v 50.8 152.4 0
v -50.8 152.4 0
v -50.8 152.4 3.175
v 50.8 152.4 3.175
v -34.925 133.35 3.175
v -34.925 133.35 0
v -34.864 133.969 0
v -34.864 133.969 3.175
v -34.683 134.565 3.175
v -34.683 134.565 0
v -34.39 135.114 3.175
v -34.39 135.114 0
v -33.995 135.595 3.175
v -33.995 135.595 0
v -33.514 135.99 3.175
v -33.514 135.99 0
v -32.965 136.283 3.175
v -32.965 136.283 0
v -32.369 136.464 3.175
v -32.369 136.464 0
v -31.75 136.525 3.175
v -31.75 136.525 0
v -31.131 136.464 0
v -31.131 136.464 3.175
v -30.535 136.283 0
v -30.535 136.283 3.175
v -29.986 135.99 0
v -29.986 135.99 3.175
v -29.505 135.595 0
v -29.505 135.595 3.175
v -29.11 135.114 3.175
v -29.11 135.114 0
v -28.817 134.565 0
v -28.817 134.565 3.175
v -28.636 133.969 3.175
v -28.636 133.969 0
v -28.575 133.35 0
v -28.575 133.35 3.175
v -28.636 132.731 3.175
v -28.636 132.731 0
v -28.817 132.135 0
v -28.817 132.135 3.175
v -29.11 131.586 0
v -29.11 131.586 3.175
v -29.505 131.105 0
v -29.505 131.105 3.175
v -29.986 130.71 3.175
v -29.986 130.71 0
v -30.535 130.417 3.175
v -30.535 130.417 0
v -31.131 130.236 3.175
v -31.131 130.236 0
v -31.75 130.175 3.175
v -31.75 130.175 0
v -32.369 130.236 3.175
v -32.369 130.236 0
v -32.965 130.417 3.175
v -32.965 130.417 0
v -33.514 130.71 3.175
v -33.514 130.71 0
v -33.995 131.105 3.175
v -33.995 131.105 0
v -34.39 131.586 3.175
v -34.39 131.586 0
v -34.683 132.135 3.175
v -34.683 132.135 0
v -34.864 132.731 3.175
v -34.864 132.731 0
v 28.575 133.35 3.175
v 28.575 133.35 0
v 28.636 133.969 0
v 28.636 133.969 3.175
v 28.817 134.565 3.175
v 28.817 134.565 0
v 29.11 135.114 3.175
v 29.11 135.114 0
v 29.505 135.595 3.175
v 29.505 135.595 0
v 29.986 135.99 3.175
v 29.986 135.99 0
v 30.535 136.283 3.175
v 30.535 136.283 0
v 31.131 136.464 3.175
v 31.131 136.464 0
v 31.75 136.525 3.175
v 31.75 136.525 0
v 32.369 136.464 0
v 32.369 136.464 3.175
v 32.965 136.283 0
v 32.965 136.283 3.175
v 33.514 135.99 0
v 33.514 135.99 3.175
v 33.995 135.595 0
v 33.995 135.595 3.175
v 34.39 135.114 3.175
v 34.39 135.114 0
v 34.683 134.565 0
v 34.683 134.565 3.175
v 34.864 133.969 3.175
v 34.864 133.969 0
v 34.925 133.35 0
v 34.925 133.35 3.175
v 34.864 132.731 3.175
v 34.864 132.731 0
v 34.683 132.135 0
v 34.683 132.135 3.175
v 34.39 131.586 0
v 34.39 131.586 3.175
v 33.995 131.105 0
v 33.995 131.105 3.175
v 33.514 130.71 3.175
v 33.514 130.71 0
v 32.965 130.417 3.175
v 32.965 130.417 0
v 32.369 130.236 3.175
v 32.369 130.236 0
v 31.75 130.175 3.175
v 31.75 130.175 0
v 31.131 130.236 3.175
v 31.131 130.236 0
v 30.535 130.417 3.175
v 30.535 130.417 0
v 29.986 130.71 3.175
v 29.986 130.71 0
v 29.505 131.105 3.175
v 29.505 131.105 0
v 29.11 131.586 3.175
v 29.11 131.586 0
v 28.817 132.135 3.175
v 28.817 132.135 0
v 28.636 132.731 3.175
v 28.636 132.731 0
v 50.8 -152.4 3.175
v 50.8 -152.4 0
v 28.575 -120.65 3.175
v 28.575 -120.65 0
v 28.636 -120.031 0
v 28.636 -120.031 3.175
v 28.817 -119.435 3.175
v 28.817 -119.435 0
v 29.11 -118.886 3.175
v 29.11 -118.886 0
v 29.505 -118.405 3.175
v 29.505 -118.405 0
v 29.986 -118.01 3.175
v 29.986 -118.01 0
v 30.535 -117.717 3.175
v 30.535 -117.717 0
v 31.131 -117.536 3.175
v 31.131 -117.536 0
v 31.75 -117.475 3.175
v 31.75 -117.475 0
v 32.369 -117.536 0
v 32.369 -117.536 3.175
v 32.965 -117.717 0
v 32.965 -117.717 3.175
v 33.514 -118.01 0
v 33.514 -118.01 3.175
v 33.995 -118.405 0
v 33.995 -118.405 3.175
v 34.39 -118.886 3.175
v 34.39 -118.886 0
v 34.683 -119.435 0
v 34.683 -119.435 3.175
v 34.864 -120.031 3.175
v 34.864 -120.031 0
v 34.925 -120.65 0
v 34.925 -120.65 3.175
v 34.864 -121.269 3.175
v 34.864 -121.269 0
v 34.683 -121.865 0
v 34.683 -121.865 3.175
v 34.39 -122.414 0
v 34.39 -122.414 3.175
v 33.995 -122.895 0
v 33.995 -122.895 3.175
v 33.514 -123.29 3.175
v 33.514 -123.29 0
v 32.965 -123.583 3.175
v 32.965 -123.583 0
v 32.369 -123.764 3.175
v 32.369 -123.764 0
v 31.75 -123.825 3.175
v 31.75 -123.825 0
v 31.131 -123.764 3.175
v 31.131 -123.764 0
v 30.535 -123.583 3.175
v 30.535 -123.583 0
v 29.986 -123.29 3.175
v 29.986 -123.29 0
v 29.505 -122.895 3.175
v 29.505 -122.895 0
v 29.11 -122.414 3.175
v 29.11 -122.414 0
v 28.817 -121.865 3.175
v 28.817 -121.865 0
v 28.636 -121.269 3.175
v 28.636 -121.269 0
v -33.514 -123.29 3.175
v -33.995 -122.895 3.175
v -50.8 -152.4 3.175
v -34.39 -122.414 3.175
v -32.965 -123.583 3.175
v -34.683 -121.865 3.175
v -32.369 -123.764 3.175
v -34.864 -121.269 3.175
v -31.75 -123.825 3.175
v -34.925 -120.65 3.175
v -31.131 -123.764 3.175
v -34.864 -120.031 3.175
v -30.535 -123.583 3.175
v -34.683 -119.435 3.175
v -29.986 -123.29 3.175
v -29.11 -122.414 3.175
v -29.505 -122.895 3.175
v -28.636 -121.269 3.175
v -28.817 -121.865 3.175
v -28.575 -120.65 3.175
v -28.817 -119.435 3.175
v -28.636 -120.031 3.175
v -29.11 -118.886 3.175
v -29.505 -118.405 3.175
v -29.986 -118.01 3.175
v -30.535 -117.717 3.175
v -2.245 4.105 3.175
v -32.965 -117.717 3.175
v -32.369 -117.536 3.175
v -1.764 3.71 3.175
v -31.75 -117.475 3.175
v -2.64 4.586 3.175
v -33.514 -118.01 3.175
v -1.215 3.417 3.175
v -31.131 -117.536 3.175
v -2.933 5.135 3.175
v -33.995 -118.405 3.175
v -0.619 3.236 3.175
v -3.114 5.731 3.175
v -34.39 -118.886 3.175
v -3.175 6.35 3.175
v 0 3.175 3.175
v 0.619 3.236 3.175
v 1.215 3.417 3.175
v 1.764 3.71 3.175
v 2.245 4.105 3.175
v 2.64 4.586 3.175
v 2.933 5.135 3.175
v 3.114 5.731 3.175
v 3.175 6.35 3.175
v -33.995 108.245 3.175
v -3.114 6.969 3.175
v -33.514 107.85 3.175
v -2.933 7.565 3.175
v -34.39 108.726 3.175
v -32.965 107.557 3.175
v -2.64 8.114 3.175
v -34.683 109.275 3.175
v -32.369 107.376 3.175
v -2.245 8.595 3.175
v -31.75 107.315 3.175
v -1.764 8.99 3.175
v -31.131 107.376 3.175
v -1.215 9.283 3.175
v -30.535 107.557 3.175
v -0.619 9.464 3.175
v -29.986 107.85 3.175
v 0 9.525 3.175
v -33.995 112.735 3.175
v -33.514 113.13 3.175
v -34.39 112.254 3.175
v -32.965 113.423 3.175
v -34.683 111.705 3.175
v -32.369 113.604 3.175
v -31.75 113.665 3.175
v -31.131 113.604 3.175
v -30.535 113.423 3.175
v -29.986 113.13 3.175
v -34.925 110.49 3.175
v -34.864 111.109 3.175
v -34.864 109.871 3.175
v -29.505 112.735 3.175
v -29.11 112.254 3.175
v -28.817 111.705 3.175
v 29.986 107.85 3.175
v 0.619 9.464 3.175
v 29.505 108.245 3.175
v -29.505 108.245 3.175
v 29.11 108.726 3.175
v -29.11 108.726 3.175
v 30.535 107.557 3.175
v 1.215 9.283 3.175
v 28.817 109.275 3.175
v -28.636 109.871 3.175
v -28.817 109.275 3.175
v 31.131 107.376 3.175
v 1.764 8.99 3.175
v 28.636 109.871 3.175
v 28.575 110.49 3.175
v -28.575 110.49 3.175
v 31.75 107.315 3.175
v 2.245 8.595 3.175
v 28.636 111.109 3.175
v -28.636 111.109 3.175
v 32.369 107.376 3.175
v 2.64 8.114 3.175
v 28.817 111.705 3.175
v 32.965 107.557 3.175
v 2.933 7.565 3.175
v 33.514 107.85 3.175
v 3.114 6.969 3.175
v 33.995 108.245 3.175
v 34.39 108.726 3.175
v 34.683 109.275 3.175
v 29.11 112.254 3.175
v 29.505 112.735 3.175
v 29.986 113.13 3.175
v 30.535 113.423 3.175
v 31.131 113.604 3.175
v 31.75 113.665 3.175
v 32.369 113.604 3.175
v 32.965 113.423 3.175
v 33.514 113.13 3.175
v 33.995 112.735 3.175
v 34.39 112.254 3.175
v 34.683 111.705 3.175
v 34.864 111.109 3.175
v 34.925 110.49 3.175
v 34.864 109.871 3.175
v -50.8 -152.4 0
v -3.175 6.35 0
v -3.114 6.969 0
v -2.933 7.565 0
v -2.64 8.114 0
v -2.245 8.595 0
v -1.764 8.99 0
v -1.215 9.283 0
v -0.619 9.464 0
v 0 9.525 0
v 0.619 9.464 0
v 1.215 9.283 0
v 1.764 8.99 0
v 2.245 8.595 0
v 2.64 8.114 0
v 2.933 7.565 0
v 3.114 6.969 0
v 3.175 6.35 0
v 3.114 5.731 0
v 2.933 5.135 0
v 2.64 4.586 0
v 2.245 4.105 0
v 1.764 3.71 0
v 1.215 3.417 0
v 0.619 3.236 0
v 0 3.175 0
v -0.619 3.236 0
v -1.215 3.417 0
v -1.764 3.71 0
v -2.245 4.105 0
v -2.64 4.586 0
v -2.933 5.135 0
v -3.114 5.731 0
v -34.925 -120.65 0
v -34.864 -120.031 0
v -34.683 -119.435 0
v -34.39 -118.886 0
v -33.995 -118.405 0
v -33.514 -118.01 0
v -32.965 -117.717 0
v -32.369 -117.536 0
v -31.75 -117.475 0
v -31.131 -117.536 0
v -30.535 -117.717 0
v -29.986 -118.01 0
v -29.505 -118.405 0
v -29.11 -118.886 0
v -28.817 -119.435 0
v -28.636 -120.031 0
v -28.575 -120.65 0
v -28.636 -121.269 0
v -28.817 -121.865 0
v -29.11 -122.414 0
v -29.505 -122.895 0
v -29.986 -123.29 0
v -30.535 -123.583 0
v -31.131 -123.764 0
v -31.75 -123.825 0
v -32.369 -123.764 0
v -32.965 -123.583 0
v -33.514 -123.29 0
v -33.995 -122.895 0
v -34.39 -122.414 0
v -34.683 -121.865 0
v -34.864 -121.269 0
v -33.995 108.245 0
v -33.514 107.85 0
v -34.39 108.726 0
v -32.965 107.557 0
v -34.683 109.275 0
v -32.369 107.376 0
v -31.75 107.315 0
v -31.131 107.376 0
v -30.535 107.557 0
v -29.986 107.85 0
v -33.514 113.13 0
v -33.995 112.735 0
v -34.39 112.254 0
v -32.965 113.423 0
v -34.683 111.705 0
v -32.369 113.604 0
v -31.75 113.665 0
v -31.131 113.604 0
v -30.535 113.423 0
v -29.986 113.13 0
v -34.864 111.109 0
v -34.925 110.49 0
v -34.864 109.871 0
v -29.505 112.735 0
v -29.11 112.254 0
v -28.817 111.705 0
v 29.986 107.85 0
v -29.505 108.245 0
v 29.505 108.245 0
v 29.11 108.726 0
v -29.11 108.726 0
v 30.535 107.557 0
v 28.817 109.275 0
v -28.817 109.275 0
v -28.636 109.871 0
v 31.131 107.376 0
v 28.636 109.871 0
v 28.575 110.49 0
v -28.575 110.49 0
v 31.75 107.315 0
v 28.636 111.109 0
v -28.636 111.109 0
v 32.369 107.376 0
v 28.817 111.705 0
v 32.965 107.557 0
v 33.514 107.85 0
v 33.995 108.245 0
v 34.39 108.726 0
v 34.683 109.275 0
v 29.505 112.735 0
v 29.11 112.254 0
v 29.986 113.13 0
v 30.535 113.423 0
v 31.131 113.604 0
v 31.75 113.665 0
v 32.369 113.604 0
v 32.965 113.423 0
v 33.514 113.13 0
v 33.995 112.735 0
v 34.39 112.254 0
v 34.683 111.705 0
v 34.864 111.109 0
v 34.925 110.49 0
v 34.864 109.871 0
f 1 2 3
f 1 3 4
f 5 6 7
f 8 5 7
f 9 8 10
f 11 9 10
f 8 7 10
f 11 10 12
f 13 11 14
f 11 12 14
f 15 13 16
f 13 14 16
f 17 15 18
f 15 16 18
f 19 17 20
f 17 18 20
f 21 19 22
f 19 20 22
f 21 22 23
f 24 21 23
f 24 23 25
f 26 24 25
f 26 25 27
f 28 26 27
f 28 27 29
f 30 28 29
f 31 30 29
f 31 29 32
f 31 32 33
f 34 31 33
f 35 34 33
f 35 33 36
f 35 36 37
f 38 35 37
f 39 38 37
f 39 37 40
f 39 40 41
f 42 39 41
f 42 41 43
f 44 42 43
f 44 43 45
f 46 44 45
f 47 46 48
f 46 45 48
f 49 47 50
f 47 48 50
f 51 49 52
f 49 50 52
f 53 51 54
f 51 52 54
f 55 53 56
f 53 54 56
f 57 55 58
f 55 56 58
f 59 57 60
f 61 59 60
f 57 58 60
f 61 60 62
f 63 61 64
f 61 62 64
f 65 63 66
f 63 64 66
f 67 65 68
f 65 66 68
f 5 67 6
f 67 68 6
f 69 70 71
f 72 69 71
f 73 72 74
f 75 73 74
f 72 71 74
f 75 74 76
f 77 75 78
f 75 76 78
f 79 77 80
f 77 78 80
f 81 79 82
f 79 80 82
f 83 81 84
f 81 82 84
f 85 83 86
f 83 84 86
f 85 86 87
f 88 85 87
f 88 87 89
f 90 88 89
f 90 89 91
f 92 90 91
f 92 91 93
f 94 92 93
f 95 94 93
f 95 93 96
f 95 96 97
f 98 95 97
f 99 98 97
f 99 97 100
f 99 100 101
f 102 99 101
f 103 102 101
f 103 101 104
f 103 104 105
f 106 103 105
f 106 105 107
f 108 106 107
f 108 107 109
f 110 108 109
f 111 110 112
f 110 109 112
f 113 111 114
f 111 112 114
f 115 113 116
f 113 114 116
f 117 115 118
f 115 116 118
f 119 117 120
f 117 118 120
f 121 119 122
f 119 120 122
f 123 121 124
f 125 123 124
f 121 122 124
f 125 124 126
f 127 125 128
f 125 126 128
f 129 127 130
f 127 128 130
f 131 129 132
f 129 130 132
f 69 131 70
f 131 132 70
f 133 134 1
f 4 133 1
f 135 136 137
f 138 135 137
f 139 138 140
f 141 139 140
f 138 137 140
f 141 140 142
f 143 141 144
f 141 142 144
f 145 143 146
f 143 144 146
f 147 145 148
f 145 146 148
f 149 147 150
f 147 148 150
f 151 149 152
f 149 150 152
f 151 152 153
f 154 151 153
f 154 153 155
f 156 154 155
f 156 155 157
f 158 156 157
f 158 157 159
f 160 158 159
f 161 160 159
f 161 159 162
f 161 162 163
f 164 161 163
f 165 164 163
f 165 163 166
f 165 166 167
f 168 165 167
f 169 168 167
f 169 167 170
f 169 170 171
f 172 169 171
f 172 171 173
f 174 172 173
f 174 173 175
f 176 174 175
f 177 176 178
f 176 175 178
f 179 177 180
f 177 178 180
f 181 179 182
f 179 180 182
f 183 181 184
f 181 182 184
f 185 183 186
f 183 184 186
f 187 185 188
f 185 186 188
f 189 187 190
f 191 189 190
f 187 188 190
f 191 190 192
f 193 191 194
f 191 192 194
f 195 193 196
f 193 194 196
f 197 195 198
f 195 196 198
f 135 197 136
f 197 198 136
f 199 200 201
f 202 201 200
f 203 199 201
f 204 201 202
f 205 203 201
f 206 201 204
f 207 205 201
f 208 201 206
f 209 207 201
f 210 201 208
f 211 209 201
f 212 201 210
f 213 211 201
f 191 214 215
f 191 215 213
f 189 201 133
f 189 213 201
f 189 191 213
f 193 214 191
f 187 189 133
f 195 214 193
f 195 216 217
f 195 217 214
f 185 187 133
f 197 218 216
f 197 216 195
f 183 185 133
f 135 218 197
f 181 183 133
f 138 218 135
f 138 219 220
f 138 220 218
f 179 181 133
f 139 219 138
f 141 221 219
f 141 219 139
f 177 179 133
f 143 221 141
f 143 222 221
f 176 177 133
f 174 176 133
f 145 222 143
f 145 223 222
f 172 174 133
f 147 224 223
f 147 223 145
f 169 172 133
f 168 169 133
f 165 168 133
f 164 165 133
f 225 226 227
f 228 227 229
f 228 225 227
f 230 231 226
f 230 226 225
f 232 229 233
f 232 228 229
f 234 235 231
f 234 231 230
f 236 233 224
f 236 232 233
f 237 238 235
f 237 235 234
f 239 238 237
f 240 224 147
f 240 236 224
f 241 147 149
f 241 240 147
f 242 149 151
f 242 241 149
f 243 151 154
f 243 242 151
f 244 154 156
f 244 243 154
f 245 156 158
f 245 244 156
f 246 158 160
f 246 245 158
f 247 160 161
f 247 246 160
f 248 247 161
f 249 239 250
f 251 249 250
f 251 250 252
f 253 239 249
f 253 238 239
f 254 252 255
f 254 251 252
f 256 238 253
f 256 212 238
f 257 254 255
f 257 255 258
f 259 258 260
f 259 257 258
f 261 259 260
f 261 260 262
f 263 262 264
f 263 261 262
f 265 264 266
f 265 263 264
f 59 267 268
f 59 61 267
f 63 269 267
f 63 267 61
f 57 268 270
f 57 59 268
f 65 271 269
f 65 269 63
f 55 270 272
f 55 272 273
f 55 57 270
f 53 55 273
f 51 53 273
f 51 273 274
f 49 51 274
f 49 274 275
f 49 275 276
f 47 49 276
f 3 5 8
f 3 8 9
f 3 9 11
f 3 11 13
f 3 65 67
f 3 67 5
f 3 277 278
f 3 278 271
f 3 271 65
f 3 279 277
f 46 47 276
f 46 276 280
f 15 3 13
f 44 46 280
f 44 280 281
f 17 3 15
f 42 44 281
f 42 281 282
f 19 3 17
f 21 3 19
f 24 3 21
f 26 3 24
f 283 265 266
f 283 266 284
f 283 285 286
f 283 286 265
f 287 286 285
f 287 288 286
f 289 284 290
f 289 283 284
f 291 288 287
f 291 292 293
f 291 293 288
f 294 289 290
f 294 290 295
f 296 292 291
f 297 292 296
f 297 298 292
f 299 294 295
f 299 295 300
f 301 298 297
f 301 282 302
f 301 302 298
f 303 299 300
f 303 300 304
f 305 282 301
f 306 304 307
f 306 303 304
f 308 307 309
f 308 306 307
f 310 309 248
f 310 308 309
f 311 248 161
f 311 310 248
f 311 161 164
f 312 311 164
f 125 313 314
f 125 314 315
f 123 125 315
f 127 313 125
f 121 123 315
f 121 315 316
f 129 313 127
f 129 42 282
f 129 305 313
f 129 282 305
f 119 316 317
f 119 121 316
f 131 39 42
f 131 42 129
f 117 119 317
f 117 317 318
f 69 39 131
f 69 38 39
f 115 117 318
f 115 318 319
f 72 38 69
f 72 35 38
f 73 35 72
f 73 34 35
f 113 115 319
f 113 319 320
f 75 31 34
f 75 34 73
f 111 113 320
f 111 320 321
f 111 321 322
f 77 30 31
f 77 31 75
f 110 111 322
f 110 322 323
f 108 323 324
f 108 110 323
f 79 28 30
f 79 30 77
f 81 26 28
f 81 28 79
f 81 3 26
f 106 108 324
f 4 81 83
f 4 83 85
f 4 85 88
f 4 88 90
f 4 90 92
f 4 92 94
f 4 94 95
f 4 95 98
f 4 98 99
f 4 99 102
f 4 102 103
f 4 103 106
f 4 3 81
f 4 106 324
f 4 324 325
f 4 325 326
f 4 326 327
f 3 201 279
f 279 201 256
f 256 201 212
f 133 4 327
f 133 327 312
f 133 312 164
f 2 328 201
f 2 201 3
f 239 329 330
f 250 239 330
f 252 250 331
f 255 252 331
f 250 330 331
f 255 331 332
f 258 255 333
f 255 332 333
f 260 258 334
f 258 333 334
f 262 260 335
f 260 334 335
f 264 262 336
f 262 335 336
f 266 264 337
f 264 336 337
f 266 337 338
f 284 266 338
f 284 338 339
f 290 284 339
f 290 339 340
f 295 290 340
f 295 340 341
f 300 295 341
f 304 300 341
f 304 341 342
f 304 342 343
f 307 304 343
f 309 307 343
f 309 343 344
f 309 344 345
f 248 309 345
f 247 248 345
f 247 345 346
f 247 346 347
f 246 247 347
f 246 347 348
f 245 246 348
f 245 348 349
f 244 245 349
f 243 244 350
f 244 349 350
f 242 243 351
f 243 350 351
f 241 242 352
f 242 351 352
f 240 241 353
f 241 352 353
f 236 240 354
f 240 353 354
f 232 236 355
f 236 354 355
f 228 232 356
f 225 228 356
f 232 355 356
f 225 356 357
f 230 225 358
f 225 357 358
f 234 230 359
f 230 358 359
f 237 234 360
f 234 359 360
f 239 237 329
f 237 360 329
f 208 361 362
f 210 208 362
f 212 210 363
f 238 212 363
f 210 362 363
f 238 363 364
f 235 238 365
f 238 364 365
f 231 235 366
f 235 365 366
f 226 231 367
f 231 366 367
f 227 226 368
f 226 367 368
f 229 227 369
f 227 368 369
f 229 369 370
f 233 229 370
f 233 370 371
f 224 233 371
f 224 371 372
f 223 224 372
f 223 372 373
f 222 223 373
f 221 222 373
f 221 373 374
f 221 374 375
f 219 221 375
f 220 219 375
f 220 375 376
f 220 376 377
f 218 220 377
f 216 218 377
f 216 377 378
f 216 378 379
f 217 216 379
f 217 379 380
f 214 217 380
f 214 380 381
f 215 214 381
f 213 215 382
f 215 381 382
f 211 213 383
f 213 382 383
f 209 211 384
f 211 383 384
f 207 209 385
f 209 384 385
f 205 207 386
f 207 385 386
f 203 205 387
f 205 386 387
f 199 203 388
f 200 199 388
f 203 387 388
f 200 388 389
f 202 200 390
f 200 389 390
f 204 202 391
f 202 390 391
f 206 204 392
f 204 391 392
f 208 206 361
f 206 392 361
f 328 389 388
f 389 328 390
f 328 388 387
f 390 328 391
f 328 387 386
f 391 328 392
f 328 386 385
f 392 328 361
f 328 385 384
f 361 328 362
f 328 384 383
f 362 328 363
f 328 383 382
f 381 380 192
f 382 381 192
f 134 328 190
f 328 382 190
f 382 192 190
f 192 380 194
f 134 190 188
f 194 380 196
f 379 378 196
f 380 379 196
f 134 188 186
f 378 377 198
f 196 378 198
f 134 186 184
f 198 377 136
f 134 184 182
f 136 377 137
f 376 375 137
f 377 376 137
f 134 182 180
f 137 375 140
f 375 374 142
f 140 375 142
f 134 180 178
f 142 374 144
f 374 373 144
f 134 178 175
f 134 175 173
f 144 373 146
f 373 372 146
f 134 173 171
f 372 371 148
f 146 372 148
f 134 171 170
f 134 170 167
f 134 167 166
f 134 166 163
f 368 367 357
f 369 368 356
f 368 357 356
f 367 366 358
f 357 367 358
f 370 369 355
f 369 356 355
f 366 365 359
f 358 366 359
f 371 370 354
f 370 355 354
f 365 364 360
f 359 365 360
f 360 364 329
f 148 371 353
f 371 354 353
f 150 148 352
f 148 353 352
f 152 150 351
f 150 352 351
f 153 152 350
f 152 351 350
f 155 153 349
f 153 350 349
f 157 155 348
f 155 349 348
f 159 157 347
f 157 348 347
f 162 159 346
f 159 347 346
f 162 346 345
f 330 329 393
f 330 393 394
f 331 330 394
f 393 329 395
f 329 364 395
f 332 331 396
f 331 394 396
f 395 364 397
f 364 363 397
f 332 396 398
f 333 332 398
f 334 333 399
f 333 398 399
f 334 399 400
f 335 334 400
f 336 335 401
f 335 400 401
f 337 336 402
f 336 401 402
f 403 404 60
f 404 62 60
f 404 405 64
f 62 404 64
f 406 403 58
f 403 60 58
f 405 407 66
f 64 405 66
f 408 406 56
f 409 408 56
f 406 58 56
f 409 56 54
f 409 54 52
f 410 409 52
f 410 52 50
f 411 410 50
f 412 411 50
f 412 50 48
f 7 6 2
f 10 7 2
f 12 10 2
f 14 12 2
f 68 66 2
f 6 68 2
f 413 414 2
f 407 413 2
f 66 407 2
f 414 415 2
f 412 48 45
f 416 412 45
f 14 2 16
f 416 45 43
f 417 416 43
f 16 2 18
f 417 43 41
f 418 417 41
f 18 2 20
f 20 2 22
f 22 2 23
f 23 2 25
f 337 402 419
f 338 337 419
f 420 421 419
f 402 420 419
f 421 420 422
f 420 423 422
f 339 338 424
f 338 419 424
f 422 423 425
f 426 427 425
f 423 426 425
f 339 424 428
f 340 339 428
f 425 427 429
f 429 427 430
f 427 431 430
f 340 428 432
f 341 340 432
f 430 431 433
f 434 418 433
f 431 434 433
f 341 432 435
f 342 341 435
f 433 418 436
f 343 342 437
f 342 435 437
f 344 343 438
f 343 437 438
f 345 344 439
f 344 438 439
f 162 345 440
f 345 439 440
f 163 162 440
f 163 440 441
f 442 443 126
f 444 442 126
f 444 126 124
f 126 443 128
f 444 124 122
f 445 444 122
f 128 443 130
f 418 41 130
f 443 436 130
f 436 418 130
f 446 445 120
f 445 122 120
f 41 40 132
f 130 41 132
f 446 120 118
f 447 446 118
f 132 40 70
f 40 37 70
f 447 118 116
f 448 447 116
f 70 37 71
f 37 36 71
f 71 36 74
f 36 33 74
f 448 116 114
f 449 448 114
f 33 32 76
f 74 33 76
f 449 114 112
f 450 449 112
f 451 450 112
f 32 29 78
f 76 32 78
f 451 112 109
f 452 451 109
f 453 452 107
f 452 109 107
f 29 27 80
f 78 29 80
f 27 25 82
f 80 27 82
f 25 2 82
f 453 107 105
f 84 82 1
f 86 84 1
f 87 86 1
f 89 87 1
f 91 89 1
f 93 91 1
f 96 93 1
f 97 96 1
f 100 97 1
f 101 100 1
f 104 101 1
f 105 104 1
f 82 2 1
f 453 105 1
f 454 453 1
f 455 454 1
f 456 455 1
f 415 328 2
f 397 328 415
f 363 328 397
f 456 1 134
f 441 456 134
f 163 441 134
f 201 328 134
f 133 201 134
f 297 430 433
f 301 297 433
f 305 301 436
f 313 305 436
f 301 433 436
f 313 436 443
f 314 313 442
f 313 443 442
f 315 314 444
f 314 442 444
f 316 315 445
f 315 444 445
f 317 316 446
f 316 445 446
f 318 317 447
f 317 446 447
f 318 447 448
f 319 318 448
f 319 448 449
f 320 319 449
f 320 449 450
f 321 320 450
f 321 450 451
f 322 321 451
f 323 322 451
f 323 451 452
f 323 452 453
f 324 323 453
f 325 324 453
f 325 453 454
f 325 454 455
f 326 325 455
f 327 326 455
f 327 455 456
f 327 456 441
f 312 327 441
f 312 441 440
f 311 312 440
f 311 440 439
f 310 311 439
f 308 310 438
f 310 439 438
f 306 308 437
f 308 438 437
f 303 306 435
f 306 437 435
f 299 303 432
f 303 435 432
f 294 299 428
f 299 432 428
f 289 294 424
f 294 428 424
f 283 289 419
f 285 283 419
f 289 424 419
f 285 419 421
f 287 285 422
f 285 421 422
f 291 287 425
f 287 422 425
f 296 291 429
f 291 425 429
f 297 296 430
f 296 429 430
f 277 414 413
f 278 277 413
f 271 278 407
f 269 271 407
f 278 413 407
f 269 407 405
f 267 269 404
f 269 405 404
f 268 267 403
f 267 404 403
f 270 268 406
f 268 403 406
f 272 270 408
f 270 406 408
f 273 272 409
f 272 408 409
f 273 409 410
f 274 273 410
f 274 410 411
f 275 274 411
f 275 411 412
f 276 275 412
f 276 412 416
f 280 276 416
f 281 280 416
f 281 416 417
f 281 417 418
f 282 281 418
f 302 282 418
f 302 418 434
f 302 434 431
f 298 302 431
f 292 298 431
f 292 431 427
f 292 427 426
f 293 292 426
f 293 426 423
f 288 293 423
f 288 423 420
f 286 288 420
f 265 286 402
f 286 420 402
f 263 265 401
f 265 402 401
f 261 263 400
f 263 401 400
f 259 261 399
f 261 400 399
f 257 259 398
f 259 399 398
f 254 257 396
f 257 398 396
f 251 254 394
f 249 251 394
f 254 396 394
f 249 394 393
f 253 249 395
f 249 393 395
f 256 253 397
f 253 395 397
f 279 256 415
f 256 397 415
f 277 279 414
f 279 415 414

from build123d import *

# Parameters (mm, degrees)
F0_W     = 101.6
F0_H     = 304.8
F1_DEPTH = 3.175
F3_D     = 6.35


# Not quite as in the source:
# - a length typed as a fraction of an inch, garbled in the dataset ("3 / 203.2 mm" for 3/8 in), is restored


with BuildPart() as f1:
    # F0 (on Top) → F1 (new body)
    with BuildSketch(Plane.XY):
        Rectangle(F0_W, F0_H)
    extrude(amount=F1_DEPTH)

    # F3 (through all)
    with Locations(Plane.XY.offset(3.175)):
        with Locations((-31.75, 133.35), (31.75, 133.35), (31.75, -120.65), (-31.75, -120.65), (0, 6.35), (-31.75, 110.49), (31.75, 110.49)):
            Hole(F3_D / 2)


solid = f1.part
